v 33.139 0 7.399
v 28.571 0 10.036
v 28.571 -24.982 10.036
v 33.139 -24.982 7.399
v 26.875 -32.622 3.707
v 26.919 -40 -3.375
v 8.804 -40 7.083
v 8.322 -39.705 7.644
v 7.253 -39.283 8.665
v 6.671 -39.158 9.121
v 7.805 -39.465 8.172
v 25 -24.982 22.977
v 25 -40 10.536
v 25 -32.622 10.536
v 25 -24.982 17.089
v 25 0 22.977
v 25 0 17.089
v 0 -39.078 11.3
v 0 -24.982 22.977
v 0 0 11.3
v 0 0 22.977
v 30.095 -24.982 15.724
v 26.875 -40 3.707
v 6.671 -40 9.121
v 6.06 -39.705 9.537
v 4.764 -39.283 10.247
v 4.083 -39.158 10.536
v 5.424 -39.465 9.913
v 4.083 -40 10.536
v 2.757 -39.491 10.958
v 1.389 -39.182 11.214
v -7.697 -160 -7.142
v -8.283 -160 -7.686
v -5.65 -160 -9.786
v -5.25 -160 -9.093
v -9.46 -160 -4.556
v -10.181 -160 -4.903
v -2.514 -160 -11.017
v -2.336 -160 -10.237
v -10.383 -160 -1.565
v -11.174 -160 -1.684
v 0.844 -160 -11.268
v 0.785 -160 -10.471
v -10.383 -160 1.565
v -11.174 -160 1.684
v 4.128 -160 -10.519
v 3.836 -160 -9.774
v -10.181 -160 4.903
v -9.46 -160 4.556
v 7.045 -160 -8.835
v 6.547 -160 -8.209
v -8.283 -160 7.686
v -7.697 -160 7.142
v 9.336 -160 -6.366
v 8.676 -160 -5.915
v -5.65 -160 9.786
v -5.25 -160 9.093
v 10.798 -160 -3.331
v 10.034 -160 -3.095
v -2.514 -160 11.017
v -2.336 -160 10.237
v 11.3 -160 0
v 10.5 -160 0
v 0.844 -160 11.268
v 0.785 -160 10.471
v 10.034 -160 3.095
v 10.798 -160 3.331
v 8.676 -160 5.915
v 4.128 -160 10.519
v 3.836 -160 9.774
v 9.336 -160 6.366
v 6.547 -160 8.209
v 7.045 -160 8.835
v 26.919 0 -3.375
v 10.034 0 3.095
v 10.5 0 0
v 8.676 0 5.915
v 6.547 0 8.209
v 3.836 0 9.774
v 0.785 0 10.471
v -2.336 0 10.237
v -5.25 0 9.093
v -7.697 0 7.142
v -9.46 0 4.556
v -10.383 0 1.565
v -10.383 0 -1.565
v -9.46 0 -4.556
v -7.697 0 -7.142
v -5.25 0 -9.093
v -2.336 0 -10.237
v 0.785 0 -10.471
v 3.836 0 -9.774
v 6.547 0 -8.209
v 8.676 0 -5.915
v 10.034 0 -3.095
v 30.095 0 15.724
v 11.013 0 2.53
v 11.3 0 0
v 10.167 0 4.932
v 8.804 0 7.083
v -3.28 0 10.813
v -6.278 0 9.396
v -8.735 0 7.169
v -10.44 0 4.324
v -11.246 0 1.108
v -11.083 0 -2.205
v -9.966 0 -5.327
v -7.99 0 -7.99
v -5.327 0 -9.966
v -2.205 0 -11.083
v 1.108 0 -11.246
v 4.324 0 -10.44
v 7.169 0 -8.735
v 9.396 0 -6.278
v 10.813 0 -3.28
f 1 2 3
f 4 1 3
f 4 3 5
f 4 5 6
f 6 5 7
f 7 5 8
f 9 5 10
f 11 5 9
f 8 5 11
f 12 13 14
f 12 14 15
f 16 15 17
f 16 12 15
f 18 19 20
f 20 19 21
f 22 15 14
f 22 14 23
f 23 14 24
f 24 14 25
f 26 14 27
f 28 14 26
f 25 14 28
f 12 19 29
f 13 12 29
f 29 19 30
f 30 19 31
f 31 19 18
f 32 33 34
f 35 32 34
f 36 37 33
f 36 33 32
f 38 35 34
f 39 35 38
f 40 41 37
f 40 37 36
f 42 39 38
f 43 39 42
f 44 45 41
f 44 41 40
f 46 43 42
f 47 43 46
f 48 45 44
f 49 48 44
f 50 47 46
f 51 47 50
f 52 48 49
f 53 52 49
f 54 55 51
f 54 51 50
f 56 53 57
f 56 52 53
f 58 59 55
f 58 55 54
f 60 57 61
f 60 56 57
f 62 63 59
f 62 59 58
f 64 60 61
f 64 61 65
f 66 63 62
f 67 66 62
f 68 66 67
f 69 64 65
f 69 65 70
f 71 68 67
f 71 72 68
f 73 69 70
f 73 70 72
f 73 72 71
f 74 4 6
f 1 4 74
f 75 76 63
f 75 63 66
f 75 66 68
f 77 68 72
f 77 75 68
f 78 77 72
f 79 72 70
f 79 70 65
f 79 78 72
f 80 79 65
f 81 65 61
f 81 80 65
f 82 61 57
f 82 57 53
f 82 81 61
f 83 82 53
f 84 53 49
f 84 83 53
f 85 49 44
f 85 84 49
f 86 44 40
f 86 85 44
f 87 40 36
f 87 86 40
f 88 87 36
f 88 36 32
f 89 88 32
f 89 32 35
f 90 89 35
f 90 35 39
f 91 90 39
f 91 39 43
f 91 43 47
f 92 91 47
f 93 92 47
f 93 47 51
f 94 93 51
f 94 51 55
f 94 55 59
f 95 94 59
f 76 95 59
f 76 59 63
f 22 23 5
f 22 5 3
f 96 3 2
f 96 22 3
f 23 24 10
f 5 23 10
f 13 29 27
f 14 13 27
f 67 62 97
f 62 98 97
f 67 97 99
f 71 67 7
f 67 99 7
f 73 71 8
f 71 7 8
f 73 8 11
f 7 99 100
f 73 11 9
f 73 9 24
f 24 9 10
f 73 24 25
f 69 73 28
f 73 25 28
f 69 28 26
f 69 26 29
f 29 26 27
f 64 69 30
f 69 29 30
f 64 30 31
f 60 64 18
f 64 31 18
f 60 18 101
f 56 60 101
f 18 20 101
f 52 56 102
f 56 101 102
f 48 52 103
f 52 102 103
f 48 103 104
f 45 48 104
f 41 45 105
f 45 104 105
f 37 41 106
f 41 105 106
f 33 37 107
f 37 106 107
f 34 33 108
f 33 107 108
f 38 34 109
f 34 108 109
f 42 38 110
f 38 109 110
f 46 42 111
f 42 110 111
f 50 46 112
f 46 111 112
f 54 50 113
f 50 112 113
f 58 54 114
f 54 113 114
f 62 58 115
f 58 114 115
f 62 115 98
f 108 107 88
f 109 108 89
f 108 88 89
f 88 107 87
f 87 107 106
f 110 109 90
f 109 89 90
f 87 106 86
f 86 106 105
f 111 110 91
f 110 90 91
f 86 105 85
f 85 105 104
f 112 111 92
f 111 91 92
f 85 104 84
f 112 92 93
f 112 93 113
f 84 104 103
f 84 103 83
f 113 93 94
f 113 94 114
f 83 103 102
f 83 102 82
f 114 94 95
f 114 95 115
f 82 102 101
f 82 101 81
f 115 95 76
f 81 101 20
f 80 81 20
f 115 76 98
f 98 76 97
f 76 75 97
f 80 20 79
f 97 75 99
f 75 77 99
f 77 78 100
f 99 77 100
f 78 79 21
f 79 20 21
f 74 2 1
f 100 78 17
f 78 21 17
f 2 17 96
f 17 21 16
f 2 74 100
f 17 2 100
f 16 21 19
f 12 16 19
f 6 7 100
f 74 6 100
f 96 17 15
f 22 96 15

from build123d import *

# Parameters (mm, degrees)
F0_R     = 11.3
F0_R_2   = 10.5
F1_DEPTH = 160
F3_DEPTH = 25
F4_COUNT = 3
F4_ANGLE = 30


with BuildPart() as f1:
    # F0 (on Front) → F1 (new body)
    with BuildSketch(Plane.XZ):
        Circle(F0_R)
        Circle(F0_R_2, mode=Mode.SUBTRACT)
    extrude(amount=F1_DEPTH)

    # F2 (on Right) → F3 (join)
    with BuildSketch(Plane.YZ):
        Polygon((-40, 10.536463), (0, 10.536463), (0, 22.977106), (-24.981545, 22.977106), align=None)
    extrude(amount=F3_DEPTH)

    # F4: F1 ×3 about axis
    f4_axis = Axis((0, 0, 0), (0, 1, 0))


with BuildPart() as f1_1:
    add(f1.part)
    for i in range(1, F4_COUNT):
        add(f1.part.rotate(f4_axis, i * F4_ANGLE / (F4_COUNT - 1)))


solid = f1_1.part
